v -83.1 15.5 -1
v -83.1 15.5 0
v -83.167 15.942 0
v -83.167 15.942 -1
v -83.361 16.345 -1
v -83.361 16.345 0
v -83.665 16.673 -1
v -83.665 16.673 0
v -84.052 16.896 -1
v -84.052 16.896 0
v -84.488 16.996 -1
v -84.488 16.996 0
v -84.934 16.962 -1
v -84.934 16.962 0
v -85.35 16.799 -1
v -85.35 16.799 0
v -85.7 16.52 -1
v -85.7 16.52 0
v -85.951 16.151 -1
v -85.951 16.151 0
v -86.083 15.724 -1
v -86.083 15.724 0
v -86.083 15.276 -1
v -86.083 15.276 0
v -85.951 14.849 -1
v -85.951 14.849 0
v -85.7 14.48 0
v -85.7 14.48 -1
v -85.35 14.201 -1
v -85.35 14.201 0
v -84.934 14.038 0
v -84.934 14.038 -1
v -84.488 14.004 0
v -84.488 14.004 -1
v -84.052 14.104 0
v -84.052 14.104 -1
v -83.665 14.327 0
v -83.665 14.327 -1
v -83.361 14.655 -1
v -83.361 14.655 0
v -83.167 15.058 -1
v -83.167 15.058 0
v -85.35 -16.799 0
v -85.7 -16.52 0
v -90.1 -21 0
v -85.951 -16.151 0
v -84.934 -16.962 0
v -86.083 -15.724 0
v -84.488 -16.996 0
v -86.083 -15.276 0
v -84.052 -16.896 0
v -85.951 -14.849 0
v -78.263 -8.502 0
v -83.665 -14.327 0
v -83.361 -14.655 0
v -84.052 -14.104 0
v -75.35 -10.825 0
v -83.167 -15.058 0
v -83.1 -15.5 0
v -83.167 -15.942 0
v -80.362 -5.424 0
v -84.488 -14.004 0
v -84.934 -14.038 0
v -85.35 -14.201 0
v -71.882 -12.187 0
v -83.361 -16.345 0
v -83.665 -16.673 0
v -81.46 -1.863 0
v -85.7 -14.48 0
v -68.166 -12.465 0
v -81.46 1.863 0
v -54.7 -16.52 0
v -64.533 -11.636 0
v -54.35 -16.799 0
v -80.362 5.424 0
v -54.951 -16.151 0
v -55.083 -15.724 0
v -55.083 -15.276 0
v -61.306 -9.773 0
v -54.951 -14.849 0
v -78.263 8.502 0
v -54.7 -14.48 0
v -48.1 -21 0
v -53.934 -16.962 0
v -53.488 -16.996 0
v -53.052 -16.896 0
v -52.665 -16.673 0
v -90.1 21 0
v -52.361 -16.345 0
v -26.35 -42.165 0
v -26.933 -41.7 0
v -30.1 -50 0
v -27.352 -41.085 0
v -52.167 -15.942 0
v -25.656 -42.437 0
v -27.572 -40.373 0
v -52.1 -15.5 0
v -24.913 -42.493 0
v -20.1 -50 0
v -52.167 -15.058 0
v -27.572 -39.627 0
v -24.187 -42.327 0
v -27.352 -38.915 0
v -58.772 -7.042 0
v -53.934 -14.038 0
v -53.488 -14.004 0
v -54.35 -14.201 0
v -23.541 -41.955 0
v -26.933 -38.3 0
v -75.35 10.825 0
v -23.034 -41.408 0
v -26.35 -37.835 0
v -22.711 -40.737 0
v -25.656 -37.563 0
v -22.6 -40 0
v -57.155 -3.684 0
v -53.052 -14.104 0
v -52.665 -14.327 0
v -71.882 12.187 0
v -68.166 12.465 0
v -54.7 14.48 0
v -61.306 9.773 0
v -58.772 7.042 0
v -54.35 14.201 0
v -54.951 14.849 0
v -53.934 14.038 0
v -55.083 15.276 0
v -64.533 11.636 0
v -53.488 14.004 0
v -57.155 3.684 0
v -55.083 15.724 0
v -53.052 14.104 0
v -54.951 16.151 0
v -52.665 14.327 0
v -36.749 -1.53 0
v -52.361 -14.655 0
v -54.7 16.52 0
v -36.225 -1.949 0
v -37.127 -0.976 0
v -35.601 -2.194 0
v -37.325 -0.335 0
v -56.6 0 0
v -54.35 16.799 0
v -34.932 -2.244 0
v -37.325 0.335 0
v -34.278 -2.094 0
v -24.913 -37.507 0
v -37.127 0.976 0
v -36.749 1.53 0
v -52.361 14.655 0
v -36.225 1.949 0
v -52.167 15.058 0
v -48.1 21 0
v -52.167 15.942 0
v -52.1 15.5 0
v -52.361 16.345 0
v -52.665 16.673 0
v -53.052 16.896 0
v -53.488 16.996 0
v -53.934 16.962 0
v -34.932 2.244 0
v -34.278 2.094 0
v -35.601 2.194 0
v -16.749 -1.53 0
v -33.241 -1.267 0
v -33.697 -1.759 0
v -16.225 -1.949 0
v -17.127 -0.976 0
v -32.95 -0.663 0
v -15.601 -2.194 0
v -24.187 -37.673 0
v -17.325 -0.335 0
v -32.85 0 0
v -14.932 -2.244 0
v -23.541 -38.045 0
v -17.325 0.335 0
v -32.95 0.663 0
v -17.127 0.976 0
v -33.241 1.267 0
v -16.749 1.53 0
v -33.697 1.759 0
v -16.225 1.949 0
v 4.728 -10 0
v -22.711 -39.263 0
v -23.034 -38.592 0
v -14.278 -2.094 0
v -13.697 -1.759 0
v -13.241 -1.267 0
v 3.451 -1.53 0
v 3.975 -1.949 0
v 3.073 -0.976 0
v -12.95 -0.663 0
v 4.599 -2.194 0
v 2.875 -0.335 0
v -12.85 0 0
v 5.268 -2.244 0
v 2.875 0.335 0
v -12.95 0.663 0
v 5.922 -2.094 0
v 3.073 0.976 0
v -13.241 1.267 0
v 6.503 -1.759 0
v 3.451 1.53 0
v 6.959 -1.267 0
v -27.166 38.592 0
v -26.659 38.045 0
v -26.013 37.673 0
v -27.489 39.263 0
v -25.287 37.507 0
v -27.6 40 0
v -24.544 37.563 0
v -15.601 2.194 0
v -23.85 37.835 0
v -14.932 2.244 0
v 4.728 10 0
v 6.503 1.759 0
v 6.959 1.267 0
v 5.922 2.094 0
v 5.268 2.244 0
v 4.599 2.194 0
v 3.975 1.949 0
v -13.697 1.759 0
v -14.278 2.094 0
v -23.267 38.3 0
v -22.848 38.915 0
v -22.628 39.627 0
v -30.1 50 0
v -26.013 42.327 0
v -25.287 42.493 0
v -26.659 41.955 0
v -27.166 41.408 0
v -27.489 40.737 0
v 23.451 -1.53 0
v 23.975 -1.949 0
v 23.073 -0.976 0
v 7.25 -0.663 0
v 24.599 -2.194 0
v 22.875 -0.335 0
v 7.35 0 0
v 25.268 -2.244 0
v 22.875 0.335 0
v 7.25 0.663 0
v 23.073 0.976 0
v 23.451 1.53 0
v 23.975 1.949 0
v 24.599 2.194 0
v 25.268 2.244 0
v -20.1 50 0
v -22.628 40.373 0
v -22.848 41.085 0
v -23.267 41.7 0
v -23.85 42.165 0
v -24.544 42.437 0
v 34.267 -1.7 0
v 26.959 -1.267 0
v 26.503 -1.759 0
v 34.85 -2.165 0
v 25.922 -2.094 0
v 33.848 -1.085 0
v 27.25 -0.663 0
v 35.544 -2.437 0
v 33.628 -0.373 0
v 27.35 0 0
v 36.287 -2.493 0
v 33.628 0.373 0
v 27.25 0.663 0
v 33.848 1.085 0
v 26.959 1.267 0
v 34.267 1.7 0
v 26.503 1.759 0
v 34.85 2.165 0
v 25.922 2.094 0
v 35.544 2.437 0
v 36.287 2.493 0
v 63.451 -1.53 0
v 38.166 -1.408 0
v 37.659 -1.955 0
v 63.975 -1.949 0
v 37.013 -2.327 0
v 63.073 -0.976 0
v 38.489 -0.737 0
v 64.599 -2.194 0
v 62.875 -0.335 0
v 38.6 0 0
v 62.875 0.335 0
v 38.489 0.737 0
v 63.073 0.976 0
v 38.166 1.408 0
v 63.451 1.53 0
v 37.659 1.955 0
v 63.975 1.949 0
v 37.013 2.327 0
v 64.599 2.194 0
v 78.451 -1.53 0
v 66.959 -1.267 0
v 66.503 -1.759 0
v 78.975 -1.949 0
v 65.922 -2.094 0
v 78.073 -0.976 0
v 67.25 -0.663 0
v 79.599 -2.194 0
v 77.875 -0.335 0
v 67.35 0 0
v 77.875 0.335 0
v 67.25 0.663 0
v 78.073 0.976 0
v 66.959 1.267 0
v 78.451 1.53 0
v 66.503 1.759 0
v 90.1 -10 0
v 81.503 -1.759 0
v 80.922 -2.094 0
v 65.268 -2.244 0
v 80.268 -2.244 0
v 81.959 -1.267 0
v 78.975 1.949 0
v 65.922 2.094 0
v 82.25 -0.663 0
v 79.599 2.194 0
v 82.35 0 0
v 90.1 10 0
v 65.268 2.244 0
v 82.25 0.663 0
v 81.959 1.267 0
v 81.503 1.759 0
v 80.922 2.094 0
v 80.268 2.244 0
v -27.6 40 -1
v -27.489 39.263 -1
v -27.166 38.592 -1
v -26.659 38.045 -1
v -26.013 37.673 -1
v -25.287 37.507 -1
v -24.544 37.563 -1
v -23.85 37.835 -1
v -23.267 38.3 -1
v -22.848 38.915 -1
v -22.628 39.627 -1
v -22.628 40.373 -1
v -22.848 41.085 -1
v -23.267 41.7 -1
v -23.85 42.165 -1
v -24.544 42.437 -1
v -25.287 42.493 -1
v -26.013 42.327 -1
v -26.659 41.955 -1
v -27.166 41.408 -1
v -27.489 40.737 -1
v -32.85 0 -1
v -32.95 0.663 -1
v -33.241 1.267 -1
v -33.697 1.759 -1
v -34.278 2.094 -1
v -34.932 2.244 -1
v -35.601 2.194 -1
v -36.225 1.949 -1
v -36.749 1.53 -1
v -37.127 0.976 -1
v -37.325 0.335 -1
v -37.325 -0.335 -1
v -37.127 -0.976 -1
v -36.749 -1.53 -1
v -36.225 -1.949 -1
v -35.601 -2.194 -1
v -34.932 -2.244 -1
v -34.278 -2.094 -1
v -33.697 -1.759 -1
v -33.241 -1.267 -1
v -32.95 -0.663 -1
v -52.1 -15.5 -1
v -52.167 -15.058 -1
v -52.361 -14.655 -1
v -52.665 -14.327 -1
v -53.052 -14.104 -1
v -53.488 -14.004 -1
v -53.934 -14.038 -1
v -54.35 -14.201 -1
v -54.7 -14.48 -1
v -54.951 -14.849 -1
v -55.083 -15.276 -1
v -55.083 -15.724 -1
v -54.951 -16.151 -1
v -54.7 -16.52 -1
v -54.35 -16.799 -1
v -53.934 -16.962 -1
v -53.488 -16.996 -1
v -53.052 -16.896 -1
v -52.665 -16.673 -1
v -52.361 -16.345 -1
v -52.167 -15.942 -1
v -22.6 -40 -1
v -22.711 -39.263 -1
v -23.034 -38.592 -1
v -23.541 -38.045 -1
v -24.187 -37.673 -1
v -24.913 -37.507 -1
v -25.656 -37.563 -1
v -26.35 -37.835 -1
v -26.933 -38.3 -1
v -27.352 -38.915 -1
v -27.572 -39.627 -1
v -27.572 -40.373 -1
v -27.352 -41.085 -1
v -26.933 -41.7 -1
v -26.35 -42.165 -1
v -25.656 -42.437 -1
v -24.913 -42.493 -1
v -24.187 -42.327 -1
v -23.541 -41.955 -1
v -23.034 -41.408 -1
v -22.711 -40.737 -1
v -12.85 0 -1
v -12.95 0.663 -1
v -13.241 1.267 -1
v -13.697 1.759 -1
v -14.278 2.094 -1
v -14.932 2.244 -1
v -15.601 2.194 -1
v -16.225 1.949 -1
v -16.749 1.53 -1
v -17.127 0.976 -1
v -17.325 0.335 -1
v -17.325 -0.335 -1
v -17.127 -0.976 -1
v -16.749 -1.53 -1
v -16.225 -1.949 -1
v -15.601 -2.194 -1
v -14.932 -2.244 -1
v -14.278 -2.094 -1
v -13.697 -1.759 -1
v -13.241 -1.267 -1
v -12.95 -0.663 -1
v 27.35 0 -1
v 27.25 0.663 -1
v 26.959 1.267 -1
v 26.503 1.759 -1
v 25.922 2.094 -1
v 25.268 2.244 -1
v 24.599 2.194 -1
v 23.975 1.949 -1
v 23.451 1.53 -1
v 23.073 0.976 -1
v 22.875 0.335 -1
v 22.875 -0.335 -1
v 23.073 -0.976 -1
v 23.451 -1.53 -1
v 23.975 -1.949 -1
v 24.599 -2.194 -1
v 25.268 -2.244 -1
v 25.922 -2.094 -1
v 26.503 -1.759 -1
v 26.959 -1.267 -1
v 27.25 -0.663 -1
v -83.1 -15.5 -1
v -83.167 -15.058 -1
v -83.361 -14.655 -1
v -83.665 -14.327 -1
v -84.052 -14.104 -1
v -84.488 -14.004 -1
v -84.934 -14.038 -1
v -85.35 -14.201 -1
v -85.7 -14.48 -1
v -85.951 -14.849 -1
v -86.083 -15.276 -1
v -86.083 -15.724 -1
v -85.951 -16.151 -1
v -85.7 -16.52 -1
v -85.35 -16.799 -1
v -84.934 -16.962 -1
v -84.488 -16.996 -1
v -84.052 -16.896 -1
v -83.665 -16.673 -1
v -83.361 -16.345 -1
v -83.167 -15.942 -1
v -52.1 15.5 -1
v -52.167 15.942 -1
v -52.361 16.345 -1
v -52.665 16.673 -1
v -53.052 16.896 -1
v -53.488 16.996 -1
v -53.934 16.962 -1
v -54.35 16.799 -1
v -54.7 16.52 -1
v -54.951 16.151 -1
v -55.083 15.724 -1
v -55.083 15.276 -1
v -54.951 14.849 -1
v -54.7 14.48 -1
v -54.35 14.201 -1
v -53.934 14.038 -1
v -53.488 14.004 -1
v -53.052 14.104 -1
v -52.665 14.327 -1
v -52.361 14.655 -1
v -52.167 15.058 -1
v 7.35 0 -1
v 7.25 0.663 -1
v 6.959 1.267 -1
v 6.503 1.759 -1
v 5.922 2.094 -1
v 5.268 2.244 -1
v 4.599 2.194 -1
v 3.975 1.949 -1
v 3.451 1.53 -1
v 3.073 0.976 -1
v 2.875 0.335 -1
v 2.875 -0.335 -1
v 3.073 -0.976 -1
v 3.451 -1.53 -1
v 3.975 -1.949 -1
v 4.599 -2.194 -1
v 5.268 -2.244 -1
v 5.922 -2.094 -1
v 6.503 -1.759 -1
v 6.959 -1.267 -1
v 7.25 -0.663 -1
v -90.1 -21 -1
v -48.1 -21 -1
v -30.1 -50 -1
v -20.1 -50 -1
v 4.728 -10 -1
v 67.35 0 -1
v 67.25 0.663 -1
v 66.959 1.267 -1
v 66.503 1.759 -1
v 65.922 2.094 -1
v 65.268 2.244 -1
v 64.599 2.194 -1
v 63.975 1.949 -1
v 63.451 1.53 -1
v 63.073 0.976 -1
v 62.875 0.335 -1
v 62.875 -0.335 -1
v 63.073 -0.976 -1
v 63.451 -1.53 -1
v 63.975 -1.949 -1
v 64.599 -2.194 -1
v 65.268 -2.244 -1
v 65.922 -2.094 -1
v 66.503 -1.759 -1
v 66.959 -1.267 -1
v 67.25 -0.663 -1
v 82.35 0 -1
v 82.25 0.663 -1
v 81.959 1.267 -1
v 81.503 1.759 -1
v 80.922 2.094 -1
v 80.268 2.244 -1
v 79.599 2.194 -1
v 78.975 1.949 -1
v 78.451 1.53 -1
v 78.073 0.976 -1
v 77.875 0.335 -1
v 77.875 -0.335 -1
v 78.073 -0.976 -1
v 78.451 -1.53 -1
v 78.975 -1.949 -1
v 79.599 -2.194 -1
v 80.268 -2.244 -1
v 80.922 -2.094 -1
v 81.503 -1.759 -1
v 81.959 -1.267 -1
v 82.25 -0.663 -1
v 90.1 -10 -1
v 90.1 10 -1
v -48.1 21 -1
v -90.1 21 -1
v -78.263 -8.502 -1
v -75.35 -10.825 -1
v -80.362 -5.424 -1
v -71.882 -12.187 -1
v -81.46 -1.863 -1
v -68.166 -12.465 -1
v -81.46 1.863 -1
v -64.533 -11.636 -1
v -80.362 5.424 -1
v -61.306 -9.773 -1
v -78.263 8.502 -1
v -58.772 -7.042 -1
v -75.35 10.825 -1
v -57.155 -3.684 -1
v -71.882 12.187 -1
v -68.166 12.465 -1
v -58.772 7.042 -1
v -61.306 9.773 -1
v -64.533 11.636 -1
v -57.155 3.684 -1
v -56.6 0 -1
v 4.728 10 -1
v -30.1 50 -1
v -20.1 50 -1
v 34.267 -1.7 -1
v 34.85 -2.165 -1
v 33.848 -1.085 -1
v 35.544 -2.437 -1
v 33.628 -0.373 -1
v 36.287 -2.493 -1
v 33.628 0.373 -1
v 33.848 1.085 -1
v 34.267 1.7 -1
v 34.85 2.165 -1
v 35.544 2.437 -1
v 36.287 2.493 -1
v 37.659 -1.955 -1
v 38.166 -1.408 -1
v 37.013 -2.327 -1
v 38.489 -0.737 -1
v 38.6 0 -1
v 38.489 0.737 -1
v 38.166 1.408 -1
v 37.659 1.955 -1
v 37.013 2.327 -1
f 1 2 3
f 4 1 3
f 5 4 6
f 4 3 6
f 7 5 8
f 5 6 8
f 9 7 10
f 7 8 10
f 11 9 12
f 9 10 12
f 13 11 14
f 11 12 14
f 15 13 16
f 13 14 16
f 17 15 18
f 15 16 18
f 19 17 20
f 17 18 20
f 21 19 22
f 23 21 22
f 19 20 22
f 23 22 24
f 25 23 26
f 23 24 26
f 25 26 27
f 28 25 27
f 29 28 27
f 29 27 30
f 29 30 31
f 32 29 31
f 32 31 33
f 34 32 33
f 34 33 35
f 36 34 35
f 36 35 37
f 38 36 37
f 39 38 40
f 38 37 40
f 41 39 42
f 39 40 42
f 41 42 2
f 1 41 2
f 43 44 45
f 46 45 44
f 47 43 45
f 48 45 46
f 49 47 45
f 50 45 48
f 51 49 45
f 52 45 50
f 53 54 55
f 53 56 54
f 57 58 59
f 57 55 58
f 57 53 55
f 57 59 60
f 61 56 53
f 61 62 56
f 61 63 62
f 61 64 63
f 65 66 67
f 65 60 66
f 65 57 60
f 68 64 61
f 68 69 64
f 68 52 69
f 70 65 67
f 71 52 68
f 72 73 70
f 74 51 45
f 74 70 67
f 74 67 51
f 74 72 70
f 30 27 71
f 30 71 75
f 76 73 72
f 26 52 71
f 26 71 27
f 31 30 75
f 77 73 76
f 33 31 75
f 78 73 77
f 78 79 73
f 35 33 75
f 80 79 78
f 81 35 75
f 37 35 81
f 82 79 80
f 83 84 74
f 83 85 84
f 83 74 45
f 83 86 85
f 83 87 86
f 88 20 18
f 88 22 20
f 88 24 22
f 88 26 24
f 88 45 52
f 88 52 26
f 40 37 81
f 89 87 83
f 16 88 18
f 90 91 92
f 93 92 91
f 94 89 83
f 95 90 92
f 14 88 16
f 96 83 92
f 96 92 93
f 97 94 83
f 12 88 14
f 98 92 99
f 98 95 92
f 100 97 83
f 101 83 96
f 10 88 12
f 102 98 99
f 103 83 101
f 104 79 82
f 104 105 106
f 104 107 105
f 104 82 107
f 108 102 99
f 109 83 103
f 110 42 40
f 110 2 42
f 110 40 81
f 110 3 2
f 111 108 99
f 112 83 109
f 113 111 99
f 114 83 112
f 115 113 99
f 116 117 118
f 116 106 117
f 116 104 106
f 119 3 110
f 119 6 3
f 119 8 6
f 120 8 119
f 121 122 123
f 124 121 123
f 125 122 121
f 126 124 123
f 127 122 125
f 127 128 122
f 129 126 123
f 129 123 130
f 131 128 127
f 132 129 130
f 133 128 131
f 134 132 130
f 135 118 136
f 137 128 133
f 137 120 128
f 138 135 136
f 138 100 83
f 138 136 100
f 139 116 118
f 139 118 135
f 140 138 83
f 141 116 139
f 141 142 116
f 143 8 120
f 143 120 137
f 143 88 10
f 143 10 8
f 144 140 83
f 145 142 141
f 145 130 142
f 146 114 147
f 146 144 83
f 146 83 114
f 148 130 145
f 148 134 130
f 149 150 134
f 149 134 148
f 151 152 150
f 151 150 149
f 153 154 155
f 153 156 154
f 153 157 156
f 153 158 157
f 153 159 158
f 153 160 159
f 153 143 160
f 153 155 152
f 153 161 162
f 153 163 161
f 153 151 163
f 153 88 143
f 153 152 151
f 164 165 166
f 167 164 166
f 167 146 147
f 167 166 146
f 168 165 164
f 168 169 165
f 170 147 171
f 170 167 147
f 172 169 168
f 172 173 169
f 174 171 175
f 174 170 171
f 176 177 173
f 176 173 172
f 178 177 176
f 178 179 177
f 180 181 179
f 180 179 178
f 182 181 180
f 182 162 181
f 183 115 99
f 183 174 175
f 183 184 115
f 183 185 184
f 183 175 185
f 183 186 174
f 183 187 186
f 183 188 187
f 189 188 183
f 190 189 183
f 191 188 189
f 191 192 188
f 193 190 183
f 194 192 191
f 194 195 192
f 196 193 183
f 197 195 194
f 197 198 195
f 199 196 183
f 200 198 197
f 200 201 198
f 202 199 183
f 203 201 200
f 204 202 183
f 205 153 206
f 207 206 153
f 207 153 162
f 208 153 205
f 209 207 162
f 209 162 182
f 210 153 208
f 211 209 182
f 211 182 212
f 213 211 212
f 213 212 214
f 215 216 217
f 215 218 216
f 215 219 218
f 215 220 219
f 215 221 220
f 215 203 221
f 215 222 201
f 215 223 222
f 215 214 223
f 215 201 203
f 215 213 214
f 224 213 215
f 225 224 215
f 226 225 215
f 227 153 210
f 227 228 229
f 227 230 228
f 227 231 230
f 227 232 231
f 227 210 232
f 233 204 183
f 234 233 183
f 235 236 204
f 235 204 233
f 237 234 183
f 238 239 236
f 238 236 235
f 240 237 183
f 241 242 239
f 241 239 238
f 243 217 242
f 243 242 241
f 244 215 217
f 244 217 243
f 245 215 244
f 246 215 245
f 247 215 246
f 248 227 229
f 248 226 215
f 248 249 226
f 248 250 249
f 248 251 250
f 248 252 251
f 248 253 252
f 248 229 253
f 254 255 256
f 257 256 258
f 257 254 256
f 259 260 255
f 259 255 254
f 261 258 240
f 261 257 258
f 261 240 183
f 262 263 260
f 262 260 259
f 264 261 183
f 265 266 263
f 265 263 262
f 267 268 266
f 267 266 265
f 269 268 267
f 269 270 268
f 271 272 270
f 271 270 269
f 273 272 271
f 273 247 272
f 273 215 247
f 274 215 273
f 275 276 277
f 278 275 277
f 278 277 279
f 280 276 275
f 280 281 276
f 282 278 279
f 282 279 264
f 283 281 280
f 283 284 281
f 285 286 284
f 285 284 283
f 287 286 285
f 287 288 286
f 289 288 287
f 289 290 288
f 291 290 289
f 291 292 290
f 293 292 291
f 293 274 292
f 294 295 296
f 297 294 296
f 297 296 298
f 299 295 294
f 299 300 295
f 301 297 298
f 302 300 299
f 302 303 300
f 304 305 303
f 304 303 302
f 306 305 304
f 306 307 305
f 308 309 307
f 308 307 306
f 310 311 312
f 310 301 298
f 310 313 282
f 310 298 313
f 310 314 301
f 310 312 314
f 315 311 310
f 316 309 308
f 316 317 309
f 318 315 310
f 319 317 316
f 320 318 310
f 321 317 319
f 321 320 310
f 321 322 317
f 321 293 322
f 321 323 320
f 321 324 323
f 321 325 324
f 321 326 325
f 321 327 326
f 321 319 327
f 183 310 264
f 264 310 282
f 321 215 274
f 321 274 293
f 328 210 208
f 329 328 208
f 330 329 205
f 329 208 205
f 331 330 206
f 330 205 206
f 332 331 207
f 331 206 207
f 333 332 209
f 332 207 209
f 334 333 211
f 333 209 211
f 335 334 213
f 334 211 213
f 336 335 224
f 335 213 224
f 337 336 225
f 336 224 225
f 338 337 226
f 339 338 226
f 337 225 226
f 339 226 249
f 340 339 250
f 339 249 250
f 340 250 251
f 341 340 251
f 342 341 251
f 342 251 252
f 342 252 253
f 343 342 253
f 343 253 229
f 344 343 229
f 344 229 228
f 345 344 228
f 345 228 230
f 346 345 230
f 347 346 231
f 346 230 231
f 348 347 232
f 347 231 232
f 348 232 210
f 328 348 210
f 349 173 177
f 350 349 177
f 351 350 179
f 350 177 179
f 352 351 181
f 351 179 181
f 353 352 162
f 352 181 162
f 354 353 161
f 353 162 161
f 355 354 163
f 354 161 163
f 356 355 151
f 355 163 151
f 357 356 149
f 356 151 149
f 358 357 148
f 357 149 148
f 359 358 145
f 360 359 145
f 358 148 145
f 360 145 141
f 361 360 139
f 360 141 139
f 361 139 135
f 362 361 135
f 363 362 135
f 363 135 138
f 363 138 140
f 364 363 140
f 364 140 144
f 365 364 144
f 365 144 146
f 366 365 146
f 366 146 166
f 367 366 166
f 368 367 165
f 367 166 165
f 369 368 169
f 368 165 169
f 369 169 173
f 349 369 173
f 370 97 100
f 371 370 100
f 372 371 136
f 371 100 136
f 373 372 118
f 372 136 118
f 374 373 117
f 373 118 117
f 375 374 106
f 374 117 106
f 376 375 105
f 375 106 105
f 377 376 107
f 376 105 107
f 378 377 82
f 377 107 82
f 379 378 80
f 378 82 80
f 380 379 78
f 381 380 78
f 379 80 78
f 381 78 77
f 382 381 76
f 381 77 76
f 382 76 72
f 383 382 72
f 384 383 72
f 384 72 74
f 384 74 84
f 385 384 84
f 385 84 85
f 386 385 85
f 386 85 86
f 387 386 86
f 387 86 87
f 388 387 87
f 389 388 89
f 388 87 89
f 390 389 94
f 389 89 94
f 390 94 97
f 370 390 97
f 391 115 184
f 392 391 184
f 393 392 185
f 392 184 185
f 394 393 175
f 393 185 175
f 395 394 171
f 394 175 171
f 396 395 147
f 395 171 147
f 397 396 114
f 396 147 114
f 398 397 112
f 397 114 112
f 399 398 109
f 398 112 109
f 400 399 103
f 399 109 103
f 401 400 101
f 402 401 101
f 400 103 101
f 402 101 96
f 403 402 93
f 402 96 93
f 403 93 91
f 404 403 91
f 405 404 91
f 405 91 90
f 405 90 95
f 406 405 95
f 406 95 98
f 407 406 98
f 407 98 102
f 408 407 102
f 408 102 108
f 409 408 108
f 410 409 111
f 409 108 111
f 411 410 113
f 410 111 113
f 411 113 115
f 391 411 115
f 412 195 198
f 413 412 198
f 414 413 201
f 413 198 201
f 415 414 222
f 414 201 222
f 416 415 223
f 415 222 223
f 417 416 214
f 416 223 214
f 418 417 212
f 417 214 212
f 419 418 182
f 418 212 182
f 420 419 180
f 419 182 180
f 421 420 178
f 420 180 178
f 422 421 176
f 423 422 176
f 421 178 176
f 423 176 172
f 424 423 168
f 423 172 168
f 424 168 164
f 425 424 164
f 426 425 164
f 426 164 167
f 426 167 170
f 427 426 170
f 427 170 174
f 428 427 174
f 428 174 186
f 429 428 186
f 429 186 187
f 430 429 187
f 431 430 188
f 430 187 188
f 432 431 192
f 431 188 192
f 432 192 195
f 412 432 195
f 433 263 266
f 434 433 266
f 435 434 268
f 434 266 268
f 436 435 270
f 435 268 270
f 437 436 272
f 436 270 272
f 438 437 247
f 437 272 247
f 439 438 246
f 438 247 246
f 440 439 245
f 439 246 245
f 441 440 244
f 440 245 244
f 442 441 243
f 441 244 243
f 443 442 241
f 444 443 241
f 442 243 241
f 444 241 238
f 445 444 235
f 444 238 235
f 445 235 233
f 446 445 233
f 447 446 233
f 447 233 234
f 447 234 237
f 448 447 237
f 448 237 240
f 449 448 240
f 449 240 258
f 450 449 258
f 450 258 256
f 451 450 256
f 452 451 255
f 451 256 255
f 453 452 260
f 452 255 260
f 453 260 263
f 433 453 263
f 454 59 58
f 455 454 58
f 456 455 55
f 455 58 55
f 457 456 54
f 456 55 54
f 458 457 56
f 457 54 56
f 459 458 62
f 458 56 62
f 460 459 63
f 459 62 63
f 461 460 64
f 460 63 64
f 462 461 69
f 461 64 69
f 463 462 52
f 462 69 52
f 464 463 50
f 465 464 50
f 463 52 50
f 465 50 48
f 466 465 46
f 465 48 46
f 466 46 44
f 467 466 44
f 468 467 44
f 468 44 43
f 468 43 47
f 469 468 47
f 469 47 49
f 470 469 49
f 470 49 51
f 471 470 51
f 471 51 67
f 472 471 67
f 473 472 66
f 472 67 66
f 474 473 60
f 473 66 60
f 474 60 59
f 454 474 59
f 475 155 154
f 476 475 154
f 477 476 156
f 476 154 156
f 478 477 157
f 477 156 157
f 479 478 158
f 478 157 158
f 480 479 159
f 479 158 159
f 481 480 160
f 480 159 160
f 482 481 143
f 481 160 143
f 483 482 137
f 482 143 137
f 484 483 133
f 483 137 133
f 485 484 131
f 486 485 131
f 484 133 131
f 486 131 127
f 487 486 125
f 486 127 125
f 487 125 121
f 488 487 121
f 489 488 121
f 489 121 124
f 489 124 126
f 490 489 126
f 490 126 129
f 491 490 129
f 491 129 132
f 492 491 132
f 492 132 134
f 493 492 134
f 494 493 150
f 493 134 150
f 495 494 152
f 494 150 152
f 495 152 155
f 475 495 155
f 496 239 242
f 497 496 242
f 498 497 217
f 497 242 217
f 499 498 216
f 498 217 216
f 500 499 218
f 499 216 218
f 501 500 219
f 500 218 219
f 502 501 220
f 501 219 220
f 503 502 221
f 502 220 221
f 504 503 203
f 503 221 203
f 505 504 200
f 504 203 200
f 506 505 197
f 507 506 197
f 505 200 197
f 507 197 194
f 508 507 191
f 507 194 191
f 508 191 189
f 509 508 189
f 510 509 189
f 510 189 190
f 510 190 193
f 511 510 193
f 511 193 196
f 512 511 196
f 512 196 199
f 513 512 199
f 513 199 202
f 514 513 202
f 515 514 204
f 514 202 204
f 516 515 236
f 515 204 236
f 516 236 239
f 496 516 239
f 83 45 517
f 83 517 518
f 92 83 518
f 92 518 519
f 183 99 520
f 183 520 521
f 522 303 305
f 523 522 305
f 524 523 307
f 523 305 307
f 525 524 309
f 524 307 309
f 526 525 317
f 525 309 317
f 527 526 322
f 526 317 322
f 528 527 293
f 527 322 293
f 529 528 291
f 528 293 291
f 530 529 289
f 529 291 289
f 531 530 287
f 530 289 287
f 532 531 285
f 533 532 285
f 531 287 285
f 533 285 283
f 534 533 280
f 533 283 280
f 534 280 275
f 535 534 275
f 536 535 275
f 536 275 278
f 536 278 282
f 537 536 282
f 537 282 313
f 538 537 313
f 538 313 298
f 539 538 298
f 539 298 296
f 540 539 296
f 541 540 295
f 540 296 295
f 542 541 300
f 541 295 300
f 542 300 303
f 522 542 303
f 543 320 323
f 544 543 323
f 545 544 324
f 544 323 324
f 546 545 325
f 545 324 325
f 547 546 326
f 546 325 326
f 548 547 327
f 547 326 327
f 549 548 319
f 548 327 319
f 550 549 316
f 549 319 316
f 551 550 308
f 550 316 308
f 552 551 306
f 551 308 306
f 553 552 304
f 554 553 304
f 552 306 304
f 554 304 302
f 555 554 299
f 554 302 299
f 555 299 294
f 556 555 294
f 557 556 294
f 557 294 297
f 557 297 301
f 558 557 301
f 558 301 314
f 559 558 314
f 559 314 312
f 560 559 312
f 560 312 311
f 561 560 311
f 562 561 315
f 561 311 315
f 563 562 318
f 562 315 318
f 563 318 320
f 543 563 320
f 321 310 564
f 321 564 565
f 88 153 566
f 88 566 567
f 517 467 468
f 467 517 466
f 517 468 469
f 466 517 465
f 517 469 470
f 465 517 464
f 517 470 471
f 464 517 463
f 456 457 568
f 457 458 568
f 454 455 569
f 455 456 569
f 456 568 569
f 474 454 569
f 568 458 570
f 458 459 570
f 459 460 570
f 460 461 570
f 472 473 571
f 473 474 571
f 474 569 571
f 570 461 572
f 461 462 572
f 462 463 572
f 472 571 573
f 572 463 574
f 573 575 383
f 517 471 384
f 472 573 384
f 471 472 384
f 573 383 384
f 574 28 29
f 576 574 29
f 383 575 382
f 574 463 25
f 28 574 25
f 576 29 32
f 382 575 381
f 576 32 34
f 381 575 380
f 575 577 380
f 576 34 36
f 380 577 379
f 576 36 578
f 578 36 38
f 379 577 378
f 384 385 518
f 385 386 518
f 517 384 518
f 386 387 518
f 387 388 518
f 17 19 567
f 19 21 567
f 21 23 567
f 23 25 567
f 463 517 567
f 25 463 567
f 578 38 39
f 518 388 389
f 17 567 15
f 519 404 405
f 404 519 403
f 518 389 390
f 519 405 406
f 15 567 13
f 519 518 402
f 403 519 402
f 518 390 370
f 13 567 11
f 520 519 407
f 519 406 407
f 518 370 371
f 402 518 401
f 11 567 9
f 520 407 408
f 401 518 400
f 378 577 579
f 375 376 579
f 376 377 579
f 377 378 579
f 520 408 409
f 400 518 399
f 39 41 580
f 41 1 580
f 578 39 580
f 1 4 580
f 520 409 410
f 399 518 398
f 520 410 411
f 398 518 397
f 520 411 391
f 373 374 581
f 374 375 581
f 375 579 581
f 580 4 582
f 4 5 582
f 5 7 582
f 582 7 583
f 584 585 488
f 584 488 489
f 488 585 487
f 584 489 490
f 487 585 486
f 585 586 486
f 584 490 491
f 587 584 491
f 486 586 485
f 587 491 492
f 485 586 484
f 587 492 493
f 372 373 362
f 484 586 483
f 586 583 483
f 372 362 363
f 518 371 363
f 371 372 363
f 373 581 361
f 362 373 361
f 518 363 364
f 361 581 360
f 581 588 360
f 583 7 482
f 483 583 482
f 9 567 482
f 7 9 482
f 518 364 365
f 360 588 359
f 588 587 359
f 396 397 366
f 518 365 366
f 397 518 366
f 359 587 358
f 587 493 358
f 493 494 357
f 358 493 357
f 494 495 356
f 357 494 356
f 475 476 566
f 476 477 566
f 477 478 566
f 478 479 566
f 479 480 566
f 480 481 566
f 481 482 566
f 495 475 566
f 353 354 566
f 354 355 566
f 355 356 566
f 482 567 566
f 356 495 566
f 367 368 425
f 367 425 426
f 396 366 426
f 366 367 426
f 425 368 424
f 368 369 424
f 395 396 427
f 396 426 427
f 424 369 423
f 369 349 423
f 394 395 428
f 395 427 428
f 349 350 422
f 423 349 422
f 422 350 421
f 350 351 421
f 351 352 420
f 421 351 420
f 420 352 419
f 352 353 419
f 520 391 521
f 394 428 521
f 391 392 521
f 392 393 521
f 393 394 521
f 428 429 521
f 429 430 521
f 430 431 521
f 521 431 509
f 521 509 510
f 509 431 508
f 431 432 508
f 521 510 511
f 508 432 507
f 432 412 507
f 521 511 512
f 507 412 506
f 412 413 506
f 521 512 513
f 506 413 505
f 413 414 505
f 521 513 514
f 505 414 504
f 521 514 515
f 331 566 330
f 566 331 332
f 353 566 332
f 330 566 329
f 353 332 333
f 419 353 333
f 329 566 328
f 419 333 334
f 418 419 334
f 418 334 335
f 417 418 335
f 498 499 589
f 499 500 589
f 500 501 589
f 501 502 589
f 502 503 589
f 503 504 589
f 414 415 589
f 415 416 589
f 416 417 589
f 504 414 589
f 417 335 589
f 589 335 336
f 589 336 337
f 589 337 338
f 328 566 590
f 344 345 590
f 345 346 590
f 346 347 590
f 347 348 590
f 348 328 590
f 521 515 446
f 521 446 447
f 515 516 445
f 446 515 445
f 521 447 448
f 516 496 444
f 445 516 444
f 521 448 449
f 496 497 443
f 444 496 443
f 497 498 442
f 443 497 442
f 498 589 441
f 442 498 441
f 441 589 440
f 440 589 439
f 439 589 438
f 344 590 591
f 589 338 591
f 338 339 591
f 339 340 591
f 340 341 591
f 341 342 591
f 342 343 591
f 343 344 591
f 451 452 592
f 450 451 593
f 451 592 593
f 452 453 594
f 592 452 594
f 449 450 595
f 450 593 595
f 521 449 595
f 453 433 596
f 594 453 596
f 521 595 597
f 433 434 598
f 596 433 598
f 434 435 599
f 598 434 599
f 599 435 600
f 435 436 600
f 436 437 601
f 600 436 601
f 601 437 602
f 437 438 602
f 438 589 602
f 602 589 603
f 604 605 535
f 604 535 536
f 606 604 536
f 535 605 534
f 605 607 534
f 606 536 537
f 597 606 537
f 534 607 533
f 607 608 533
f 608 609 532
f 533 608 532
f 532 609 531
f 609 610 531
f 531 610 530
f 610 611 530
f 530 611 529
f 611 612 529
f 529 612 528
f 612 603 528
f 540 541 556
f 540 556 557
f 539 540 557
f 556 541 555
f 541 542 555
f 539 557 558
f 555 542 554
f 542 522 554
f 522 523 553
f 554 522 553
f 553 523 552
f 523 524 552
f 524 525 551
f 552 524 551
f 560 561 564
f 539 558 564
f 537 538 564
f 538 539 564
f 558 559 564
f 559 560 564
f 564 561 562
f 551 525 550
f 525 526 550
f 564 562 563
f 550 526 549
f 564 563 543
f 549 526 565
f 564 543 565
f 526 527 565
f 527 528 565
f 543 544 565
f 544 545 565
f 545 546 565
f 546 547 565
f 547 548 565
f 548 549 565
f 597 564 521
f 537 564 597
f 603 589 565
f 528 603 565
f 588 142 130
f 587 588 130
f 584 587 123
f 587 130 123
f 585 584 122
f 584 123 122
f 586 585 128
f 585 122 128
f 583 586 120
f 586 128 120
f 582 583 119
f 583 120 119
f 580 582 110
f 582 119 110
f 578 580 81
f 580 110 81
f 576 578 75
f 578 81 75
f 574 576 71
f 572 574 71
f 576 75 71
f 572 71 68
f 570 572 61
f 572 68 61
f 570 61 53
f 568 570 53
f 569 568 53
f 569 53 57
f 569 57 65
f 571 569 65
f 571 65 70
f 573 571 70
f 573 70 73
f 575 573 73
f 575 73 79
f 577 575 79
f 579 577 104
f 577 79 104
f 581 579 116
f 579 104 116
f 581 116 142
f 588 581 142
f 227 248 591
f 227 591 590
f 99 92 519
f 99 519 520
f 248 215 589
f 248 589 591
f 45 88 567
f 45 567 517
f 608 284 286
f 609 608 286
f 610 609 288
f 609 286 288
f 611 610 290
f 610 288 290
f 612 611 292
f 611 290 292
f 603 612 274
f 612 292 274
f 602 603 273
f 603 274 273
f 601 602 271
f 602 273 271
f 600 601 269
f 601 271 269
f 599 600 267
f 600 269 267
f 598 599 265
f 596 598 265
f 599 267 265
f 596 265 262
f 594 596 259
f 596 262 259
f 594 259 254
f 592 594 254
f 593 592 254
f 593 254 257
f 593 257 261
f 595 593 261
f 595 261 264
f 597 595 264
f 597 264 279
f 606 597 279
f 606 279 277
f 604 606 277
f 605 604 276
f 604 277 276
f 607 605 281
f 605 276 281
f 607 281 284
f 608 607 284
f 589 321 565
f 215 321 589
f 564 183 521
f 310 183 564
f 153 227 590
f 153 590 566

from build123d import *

# Parameters (mm, degrees)
SKETCH1_R          = 12.5
SKETCH1_R_2        = 1.5
SKETCH1_R_3        = 2.5
SKETCH1_R_4        = 2.25
BASE_FLANGE1_DEPTH = 1


# Sheet-metal steps are written as plain solids
with BuildPart() as part:
    # Sketch1 → Base-Flange1 (new body)
    with BuildSketch(Plane.XY):
        Polygon((-90.1, -21), (-48.1, -21), (-30.1, -50), (-20.1, -50), (4.727586207, -10), (90.1, -10), (90.1, 10), (4.727586207, 10), (-20.1, 50), (-30.1, 50), (-48.1, 21), (-90.1, 21), align=None)
        with Locations((-69.1, 0)):
            Circle(SKETCH1_R, mode=Mode.SUBTRACT)
        with Locations((-84.6, 15.5)):
            Circle(SKETCH1_R_2, mode=Mode.SUBTRACT)
        with Locations((-25.1, -40)):
            Circle(SKETCH1_R_3, mode=Mode.SUBTRACT)
        with Locations((80.1, 0)):
            Circle(SKETCH1_R_4, mode=Mode.SUBTRACT)
        with Locations((65.1, 0)):
            Circle(SKETCH1_R_4, mode=Mode.SUBTRACT)
        with Locations((25.1, 0)):
            Circle(SKETCH1_R_4, mode=Mode.SUBTRACT)
        with Locations((5.1, 0)):
            Circle(SKETCH1_R_4, mode=Mode.SUBTRACT)
        with Locations((36.1, 0)):
            Circle(SKETCH1_R_3, mode=Mode.SUBTRACT)
        with Locations(Location((-25.1, 40, 0), (0, 0, 180))):
            Circle(SKETCH1_R_3, mode=Mode.SUBTRACT)
        with Locations((-15.1, 0)):
            Circle(SKETCH1_R_4, mode=Mode.SUBTRACT)
        with Locations((-35.1, 0)):
            Circle(SKETCH1_R_4, mode=Mode.SUBTRACT)
        with Locations((-53.6, 15.5)):
            Circle(SKETCH1_R_2, mode=Mode.SUBTRACT)
        with Locations((-53.6, -15.5)):
            Circle(SKETCH1_R_2, mode=Mode.SUBTRACT)
        with Locations((-84.6, -15.5)):
            Circle(SKETCH1_R_2, mode=Mode.SUBTRACT)
    extrude(amount=-BASE_FLANGE1_DEPTH)


solid = part.part
